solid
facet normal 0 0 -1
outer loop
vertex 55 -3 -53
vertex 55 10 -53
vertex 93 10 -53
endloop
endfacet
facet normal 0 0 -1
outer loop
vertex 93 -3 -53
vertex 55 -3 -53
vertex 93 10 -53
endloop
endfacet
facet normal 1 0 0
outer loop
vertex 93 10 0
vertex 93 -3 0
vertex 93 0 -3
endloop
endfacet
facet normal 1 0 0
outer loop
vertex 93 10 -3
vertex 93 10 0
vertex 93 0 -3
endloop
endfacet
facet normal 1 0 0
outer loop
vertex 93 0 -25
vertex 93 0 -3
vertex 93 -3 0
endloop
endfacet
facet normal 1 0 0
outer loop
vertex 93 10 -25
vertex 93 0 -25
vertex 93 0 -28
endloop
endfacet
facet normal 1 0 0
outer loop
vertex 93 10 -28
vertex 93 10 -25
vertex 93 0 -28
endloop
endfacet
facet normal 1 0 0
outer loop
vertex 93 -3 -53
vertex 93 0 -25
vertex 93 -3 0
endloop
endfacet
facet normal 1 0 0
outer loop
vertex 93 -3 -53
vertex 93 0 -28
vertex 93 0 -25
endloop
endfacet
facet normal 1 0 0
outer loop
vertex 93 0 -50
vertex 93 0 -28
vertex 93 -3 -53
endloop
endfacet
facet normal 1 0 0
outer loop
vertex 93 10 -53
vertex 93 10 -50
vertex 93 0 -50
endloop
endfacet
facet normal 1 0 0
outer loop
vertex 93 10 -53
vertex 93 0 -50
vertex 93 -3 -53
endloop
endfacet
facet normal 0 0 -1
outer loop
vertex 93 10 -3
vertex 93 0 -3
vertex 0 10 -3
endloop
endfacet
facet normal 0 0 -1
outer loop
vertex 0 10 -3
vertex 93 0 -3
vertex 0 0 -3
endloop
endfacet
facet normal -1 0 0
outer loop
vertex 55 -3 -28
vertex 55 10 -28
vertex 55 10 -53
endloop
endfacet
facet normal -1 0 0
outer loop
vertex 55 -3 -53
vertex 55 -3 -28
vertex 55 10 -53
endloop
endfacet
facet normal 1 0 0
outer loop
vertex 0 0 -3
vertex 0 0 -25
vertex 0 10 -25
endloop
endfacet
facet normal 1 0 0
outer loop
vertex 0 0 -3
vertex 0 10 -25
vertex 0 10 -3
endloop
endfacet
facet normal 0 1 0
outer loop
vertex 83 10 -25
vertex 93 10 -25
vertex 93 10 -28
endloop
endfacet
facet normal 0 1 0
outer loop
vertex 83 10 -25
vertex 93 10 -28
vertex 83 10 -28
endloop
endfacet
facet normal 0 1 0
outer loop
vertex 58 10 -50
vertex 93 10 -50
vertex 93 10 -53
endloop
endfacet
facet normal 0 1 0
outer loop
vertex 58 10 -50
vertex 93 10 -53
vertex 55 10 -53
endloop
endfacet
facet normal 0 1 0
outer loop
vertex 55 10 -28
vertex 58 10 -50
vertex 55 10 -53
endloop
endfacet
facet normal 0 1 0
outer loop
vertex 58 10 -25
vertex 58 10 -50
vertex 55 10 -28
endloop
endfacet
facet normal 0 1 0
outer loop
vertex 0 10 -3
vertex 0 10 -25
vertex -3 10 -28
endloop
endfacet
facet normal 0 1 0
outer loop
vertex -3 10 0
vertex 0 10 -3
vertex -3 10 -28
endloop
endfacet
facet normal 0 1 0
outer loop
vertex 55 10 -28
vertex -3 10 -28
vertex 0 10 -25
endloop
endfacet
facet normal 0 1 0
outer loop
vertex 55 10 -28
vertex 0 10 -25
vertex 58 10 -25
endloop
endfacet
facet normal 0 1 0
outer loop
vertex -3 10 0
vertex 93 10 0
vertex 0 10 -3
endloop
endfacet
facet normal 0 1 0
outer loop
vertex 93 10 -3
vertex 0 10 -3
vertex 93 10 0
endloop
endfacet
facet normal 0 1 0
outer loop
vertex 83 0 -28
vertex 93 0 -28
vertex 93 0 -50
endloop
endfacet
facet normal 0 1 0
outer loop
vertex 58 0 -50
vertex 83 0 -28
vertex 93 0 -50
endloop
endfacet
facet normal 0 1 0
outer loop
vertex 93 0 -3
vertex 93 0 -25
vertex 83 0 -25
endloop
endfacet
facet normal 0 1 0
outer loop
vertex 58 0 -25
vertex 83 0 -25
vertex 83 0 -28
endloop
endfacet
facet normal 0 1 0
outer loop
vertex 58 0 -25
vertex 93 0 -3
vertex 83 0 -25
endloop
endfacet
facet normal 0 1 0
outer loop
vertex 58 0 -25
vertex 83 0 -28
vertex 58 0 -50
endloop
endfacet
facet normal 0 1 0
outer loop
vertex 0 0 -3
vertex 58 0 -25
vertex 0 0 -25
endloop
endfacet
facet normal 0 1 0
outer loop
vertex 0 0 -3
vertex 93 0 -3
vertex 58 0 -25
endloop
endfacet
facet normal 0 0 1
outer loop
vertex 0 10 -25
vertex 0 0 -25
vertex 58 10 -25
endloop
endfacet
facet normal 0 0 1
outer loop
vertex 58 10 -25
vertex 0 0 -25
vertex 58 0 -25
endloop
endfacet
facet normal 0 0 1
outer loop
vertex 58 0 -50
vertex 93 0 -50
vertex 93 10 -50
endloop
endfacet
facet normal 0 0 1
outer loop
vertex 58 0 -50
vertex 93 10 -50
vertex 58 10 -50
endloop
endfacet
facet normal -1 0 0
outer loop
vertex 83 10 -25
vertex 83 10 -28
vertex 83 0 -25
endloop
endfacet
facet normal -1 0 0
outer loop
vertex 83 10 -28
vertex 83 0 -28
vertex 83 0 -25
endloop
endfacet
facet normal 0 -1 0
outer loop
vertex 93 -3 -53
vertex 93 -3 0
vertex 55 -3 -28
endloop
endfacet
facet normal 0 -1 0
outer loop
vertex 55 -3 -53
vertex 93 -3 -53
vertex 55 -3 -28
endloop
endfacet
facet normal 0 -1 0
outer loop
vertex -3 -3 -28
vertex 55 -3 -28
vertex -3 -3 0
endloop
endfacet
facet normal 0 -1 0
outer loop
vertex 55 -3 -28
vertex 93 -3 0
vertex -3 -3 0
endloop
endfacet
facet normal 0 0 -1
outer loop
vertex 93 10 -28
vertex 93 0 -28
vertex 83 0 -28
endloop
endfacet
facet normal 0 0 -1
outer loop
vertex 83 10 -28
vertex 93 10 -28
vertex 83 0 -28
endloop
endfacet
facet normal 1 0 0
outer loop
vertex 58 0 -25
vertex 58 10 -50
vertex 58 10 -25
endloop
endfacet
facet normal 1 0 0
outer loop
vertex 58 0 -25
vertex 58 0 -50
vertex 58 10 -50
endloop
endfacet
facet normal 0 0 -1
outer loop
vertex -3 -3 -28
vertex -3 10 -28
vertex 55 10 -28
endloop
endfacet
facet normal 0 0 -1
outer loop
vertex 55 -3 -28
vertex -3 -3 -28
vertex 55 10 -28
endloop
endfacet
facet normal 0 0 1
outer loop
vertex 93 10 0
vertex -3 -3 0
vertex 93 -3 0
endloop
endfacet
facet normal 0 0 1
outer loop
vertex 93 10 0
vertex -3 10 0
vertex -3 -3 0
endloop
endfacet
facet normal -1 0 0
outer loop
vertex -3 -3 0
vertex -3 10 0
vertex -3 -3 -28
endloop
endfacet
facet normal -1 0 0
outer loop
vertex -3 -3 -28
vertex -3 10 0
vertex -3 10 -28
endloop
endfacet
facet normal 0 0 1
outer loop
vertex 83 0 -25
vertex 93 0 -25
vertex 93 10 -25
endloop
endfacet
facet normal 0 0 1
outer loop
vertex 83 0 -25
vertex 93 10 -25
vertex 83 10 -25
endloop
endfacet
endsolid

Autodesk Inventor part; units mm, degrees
ref_plane "YZ Plane" through (0, 0, 0) normal (1, 0, 0) x (0, 1, 0)
ref_plane "XZ Plane" through (0, 0, 0) normal (0, 1, 0) x (-1, 0, 0)
ref_plane "XY Plane" through (0, 0, 0) normal (0, 0, 1) x (1, 0, 0)
sketch "Esboço1" plane through (0, 0, 0) normal (0, 1, 0) x (-1, 0, 0)
  line L0 (-93, -3) -> (0, -3)
  line L1 (0, -25) -> (-58, -25)
  line L2 (-93, 0) -> (-93, -28)
  line L3 (-93, -28) -> (-83, -28)
  line L4 (-55, -28) -> (0, -28)
  line L5 (0, -28) -> (0, 0)
  line L6 (0, 0) -> (-93, 0)
  line L7 (-55, -28) -> (-55, -53)
  line L8 (-55, -53) -> (-93, -53)
  line L9 (-93, -53) -> (-93, -50)
  line L10 (-93, -50) -> (-58, -50)
  line L11 (-58, -50) -> (-58, -25)
  arc A0 (-83, -50) -> (-58, -25) centre (-83, -25) ccw
  arc A1 (-83, -28) -> (-80, -25) centre (-83, -25) ccw
  line L12 (-93, -25) -> (-80, -25)
  line L13 (0, 0) -> (3, 0)
  line L14 (3, 0) -> (3, -28)
  line L15 (3, -28) -> (0, -28)
  line L16 (-83, -28) -> (-83, -25)
  line L17 (-93, -50) -> (-93, -28)
  point P0 (-93, -14)
  point P1 (-93, -51.5)
  point P2 (-83, -28)
  dimension "d7" = 22
  dimension "d9" = 3
  dimension "d10" = 3
  dimension "d13" = 3
  dimension "d14" = 3
  dimension "d16" = 22
  dimension "d20" = 22
  dimension "d21" = 80
  dimension "d29" = 3
  dimension "d31" = 10
extrude "Extrusão1" add sketch "Esboço1" against normal blind 3
extrude "Extrusão2" add sketch "Esboço1" along normal blind 10 contours L2 L6 L5 L0 | L5 L13 L14 L15 | L12 L16 L3 L2 | L5 L4 L7 L8 L9 L10 L11 L1
equation "\"d9\" = mdf"
equation "\"d10\" = mdf"
equation "\"d13\" = mdf"
equation "\"d14\" = mdf"
equation "\"mdf\" = 3"
equation "\"margem\" = 1"
properties part number "Trilho 5 min"
